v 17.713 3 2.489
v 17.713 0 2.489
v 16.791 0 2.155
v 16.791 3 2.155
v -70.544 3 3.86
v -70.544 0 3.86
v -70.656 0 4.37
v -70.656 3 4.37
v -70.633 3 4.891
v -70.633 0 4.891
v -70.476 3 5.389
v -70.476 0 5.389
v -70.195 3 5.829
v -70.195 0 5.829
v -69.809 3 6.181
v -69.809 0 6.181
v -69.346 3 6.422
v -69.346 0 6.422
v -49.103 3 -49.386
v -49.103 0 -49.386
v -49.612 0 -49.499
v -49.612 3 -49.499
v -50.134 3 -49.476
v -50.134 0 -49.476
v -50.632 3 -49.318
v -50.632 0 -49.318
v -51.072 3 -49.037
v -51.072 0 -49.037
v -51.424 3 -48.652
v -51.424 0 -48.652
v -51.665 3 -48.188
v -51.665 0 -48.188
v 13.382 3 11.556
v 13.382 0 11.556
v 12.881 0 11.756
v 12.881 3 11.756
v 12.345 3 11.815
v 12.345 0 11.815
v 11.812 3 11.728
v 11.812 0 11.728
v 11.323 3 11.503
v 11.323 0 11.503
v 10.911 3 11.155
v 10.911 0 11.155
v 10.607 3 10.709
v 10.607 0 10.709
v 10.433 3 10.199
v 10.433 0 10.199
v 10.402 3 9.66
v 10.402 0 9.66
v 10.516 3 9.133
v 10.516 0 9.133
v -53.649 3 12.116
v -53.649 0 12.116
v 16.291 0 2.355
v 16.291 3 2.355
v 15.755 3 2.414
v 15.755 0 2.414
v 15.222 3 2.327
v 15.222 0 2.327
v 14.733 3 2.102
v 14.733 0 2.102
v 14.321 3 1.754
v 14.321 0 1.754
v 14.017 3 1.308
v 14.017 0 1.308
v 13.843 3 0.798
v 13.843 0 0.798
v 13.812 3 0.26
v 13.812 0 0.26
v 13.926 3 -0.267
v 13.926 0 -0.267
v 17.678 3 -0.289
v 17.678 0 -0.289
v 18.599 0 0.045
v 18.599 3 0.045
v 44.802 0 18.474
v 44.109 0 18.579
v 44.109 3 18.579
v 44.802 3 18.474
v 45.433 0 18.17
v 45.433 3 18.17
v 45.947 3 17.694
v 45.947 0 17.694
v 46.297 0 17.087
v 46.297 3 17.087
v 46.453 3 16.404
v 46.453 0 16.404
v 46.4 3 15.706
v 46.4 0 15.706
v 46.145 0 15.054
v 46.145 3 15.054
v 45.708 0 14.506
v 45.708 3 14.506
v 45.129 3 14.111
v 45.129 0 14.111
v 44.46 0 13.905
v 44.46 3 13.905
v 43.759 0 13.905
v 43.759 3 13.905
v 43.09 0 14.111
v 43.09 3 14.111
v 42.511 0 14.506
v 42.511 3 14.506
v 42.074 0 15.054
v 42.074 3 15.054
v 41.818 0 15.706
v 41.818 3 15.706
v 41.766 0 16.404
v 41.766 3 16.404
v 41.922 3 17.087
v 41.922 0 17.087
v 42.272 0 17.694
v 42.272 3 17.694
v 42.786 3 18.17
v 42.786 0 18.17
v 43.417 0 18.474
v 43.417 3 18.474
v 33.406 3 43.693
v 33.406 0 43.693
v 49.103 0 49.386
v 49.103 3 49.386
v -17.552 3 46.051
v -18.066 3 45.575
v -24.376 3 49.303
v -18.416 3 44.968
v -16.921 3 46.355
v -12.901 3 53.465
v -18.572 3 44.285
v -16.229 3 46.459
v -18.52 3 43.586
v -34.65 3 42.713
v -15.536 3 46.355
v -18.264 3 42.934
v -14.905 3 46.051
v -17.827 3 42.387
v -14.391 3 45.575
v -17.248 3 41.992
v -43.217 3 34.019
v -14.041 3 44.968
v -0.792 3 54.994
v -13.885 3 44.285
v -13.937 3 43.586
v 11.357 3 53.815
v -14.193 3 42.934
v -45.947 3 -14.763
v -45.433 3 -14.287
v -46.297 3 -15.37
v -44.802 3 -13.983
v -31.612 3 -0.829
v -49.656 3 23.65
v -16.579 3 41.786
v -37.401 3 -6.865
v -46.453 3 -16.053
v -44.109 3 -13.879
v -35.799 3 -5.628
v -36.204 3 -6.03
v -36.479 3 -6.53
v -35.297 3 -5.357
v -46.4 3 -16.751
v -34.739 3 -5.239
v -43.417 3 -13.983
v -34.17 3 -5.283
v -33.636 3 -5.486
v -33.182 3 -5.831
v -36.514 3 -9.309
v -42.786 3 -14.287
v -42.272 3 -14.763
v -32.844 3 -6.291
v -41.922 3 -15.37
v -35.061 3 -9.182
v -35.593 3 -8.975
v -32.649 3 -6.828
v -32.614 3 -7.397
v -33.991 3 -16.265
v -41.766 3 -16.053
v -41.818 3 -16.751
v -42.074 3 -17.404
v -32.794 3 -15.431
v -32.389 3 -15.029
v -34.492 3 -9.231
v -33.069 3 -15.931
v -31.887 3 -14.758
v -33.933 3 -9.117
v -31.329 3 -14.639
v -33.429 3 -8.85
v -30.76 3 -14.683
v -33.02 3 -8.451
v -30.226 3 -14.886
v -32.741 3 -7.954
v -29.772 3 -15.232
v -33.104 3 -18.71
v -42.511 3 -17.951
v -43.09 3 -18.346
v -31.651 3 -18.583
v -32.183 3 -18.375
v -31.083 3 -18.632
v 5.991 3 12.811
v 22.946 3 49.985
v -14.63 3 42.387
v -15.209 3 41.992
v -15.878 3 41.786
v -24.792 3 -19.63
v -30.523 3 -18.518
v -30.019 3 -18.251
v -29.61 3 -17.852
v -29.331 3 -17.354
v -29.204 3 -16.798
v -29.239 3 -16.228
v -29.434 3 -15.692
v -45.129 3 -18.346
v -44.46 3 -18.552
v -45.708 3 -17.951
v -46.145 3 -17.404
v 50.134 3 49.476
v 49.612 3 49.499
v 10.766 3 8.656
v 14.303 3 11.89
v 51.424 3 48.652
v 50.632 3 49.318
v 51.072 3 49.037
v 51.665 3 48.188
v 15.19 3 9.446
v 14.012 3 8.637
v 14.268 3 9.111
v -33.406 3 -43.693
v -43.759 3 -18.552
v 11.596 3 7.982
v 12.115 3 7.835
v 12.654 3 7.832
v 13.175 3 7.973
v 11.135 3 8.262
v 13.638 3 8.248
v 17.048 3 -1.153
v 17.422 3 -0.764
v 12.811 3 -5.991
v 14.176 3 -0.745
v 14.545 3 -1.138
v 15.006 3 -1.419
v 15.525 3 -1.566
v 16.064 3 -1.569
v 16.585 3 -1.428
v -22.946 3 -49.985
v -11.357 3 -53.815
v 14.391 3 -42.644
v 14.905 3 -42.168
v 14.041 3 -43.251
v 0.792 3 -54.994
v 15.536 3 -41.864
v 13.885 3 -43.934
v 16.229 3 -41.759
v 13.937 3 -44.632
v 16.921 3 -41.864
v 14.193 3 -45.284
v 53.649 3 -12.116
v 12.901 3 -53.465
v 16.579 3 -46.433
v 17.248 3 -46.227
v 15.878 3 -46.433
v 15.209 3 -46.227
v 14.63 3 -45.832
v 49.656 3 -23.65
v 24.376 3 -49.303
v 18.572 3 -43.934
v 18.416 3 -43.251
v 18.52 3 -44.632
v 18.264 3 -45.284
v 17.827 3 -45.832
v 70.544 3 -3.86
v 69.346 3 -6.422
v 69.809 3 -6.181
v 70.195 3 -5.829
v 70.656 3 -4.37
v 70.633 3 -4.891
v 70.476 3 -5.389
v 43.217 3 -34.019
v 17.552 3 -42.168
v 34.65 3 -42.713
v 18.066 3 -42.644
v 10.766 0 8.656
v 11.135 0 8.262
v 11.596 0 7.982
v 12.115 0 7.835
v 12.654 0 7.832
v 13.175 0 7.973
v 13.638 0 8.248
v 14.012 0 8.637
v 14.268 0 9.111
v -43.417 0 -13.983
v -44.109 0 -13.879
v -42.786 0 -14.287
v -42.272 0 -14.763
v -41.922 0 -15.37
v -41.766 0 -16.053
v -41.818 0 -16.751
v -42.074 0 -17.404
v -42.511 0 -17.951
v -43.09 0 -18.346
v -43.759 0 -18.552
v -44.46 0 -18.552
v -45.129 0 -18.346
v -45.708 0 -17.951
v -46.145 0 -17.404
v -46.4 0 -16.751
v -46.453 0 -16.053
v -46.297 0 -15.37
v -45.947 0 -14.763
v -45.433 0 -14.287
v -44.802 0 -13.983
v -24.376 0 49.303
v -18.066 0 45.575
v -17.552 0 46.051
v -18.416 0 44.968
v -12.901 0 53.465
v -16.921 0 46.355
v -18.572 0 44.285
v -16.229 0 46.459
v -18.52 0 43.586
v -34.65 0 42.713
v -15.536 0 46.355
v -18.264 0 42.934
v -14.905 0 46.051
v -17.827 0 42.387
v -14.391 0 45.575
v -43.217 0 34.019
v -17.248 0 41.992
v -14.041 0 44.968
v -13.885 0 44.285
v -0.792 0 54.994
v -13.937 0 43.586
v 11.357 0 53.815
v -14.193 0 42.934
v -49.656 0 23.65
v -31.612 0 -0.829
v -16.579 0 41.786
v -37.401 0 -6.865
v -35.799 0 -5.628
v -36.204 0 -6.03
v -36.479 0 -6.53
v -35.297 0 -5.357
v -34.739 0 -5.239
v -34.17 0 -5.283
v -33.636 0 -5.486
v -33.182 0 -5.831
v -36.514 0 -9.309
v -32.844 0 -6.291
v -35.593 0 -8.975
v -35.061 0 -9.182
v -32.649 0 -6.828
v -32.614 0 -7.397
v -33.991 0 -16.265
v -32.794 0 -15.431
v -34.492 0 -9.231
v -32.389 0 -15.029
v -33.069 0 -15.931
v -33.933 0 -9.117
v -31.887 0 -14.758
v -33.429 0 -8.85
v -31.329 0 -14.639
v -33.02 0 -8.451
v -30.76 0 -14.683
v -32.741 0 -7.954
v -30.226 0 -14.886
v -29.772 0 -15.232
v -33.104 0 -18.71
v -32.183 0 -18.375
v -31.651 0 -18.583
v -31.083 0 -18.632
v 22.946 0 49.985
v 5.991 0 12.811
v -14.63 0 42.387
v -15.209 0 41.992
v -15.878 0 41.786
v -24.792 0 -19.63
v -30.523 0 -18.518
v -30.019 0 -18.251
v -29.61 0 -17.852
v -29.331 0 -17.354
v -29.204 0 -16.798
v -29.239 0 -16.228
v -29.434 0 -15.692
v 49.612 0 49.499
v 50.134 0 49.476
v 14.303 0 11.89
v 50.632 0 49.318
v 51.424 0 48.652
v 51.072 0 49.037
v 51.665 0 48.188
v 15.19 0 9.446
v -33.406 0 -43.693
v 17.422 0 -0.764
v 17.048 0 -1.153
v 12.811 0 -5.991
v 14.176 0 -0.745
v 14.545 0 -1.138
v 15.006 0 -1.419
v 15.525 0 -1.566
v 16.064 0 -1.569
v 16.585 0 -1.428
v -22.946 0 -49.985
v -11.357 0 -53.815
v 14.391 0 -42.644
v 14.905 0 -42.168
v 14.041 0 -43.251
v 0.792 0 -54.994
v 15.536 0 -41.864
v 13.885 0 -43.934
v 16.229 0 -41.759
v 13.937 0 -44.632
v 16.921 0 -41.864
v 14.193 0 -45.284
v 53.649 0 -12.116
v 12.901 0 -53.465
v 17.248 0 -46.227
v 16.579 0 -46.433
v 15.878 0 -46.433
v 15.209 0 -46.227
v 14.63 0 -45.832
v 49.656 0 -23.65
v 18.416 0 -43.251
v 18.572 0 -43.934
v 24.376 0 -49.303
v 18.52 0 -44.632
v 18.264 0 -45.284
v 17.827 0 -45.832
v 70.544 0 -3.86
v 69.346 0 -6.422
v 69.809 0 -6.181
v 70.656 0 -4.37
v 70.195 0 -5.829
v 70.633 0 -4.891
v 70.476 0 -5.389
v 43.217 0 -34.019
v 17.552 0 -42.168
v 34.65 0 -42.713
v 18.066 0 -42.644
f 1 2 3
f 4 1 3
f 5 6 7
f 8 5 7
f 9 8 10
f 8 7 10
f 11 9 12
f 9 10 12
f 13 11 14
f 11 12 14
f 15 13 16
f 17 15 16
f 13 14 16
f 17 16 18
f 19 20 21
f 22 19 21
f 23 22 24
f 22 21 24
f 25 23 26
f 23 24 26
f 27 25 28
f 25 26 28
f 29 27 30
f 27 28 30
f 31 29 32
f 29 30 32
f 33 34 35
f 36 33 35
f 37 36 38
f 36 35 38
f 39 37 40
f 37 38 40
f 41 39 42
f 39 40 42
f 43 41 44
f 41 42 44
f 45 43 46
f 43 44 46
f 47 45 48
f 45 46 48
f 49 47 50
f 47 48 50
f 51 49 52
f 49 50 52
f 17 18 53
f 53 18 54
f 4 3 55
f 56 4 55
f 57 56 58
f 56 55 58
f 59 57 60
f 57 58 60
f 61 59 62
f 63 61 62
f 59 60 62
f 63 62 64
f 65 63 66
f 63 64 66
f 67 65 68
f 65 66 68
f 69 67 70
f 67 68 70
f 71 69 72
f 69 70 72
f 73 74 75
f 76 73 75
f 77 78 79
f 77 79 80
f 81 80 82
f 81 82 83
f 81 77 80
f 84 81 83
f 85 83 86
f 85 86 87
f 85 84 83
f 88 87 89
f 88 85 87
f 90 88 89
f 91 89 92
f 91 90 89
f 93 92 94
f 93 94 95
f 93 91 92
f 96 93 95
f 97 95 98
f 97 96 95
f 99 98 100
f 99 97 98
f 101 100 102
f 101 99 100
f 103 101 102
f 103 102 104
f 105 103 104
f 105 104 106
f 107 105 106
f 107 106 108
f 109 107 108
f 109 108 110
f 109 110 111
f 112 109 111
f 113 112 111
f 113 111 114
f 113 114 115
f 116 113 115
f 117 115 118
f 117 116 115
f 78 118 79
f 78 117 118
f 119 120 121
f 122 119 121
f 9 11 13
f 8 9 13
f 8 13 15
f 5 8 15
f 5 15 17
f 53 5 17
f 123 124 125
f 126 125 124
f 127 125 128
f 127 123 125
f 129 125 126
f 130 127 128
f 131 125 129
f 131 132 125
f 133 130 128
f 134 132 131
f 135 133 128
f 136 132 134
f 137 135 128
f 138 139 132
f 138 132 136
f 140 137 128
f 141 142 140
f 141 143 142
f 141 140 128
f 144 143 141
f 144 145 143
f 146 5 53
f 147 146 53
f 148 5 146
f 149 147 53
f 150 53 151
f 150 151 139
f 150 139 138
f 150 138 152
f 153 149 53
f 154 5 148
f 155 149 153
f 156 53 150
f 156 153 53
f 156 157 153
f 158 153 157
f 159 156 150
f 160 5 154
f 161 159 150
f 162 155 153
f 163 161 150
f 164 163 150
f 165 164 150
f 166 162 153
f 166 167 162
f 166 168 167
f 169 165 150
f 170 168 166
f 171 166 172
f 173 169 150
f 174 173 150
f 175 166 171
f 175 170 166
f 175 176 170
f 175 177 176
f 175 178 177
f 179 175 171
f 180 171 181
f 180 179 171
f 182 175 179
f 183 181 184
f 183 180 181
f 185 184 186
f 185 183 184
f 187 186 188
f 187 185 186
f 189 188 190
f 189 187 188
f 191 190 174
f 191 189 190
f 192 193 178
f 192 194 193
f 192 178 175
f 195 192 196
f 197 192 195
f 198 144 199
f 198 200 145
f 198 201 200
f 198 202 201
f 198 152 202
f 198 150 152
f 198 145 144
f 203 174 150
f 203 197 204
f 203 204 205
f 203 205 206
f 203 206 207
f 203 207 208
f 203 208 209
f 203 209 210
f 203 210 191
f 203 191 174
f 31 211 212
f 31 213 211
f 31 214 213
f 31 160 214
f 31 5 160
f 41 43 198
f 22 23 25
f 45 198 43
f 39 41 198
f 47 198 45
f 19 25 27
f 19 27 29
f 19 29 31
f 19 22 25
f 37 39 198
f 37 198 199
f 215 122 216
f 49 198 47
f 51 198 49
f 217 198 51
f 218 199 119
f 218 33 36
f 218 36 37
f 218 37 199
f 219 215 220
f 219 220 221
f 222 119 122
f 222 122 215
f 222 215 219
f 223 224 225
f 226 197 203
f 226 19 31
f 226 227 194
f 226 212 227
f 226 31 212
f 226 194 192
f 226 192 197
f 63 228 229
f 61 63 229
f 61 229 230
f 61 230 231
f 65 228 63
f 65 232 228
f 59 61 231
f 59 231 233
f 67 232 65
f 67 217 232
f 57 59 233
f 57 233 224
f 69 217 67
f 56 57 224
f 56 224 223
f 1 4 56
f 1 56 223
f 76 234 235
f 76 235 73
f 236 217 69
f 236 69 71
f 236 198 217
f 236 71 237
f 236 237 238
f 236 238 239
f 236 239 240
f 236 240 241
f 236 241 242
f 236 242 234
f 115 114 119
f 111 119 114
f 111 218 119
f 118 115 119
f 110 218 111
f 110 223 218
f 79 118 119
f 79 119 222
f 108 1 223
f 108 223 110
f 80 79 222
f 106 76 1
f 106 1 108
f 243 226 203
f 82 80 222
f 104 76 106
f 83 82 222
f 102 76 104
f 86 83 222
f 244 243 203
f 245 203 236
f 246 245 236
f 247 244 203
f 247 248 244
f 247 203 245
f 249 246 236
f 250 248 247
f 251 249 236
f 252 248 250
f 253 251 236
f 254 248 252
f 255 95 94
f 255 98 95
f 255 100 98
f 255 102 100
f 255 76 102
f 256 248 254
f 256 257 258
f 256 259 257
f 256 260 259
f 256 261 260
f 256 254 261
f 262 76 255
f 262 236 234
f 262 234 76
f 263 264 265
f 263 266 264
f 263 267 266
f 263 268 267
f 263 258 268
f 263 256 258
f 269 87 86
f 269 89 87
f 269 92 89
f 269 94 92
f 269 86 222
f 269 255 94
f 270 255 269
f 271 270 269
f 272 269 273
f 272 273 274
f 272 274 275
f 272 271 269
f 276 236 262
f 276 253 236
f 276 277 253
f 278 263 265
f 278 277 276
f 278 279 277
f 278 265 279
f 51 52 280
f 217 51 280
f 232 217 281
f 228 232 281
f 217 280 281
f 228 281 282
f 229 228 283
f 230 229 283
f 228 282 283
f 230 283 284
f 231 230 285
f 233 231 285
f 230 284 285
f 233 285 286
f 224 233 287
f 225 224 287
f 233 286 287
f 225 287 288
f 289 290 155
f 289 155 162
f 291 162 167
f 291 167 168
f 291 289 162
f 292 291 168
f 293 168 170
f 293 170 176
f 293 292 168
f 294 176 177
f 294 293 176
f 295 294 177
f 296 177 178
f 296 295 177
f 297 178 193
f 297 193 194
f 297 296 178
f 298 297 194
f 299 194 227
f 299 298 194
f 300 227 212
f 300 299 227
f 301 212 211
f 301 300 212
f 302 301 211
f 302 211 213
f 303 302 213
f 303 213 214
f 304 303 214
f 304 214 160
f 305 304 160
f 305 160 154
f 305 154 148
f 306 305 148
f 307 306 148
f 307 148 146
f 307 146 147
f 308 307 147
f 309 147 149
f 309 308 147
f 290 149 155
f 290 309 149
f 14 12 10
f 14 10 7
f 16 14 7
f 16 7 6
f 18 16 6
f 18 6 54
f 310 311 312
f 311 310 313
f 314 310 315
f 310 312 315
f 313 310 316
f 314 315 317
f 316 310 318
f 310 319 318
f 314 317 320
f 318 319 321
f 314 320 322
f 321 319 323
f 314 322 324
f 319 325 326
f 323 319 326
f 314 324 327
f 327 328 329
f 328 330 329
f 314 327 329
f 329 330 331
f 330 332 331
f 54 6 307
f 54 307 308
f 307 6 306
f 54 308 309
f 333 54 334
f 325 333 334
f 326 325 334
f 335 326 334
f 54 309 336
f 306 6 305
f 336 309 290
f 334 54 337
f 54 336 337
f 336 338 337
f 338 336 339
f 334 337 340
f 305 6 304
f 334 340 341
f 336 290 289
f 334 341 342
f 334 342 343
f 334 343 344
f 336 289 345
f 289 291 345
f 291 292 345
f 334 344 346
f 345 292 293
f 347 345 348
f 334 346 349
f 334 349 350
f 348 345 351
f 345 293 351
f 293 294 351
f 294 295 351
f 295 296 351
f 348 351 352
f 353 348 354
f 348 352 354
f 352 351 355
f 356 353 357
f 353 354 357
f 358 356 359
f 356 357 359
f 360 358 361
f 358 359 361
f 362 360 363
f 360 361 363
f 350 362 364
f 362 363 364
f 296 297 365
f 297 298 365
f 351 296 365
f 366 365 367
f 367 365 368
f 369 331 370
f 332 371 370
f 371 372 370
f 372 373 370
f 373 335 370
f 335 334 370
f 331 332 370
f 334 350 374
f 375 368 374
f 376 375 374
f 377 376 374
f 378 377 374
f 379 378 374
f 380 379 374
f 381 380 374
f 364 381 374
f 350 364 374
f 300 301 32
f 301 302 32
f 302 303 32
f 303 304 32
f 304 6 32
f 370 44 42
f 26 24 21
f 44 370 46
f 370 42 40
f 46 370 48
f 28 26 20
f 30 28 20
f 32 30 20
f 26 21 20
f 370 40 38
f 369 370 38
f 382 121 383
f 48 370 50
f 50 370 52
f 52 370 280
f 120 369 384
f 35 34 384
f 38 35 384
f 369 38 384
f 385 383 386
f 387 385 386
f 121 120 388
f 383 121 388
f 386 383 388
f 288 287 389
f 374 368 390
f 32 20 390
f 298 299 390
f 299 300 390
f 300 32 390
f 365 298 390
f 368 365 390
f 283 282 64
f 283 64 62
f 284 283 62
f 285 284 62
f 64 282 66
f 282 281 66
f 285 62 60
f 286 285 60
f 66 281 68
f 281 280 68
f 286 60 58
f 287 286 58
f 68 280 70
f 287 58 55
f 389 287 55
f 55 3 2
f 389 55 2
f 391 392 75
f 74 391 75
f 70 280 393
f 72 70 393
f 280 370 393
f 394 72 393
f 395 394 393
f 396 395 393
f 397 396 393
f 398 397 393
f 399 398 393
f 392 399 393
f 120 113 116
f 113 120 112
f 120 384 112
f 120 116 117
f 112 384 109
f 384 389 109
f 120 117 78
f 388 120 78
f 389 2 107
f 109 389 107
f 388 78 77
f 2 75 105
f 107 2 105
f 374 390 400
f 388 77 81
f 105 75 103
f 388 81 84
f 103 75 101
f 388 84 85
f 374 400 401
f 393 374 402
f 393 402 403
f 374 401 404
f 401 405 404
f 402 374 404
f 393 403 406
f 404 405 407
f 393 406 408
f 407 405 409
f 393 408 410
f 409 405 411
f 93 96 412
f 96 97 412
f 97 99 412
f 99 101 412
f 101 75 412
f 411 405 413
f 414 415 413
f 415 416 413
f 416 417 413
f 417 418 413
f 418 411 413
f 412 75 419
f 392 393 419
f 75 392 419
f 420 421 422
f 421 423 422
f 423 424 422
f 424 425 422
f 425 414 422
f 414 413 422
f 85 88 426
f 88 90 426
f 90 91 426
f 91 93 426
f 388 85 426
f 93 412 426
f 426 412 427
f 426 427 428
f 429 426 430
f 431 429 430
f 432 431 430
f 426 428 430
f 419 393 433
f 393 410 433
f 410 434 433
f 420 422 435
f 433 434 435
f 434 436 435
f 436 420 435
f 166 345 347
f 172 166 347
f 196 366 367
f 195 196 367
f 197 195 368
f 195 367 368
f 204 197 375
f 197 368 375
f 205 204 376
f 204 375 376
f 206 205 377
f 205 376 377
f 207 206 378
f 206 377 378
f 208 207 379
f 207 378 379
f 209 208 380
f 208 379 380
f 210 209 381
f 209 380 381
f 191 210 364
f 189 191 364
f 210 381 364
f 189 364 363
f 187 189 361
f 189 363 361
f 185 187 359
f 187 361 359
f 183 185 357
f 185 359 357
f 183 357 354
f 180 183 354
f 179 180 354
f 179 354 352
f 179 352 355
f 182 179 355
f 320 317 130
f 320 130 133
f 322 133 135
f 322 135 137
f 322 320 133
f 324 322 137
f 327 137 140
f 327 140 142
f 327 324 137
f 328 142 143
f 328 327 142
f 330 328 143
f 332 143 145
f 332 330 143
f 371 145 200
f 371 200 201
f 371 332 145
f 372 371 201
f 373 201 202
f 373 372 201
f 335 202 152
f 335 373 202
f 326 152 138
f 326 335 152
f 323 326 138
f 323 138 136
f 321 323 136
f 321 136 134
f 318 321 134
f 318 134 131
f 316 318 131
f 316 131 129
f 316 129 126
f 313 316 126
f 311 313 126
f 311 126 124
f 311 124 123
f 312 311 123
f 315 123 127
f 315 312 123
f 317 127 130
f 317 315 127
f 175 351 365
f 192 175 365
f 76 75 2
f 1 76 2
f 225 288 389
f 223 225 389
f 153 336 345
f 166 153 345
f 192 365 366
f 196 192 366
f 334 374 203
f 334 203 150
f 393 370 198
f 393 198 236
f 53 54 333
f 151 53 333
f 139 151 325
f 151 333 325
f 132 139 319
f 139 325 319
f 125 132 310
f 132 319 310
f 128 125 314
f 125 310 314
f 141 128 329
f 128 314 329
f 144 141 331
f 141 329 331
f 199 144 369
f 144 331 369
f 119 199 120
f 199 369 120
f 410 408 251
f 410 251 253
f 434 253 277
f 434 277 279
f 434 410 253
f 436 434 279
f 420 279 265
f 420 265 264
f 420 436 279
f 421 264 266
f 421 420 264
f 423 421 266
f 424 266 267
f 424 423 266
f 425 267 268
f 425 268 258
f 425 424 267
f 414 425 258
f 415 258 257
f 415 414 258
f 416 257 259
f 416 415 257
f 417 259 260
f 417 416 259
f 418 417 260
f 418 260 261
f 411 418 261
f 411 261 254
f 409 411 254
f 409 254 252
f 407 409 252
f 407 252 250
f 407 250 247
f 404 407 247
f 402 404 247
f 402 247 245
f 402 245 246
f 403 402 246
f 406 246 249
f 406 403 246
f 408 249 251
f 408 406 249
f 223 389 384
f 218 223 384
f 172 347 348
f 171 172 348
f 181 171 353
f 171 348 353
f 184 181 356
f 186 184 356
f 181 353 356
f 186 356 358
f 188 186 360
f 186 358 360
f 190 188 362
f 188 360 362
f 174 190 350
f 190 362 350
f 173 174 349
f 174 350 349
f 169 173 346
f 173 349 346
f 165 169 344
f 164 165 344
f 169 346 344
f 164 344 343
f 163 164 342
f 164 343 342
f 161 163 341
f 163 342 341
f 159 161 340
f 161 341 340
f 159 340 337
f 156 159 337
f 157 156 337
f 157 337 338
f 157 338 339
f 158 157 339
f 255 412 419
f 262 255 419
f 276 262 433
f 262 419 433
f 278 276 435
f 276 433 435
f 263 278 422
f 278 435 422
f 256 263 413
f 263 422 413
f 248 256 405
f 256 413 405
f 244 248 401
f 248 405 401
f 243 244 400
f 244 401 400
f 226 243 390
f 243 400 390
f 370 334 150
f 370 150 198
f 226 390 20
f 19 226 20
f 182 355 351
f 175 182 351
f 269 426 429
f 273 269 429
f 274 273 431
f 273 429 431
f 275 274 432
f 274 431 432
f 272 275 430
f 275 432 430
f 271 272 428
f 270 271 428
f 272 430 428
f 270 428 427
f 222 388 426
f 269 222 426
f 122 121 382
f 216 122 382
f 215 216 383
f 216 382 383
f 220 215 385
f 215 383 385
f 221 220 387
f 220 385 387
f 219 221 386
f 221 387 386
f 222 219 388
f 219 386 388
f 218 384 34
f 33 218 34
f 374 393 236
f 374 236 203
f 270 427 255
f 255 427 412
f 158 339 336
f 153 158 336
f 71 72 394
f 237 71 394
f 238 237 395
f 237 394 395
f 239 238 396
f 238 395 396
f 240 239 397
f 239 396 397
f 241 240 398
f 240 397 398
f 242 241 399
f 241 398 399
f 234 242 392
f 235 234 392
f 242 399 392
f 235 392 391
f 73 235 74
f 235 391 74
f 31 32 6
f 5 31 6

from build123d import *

# Parameters (mm, degrees)
SKETCH_10_R         = 2.35
EXTRUDE_2_DEPTH     = 3
CUT_EXTRUDE_3_DEPTH = 3


with BuildPart() as part:
    # 草图10 → 凸台-拉伸2 (new body)
    with BuildSketch(Plane(origin=(0, 0, 0), x_dir=(1, 0, 0), z_dir=(0, 1, 0))):
        with BuildLine():
            Line((33.405753886, -43.6927409), (49.102625926, -49.386437869))
            ThreePointArc((49.102625926, -49.386437869), (50.631828553, -49.317990247), (51.664738322, -48.188280923))
            Line((51.664738322, -48.188280923), (70.544015322, 3.859728807))
            ThreePointArc((70.544015322, 3.859728807), (70.4755677, 5.388931433), (69.345858375, 6.421841203))
            Line((69.345858375, 6.421841203), (53.648986335, 12.115538173))
            ThreePointArc((53.648986335, 12.115538173), (18.754387434, 51.703703465), (-33.405753886, 43.6927409))
            Line((-33.405753886, 43.6927409), (-49.102625926, 49.386437869))
            ThreePointArc((-49.102625926, 49.386437869), (-50.631828553, 49.317990247), (-51.664738322, 48.188280923))
            Line((-51.664738322, 48.188280923), (-70.544015322, -3.859728807))
            ThreePointArc((-70.544015322, -3.859728807), (-70.4755677, -5.388931433), (-69.345858375, -6.421841203))
            Line((-69.345858375, -6.421841203), (-53.648986335, -12.115538173))
            ThreePointArc((-53.648986335, -12.115538173), (-18.754387434, -51.703703465), (33.405753886, -43.6927409))
        make_face()
        with Locations(Location((16.22853422, 44.109349089, 0), (0, 0, 270))):
            Circle(SKETCH_10_R, mode=Mode.SUBTRACT)
        with Locations(Location((-44.109349089, 16.22853422, 0), (0, 0, 270))):
            Circle(SKETCH_10_R, mode=Mode.SUBTRACT)
        with Locations(Location((-16.22853422, -44.109349089, 0), (0, 0, 270))):
            Circle(SKETCH_10_R, mode=Mode.SUBTRACT)
        with Locations(Location((44.109349089, -16.22853422, 0), (0, 0, 270))):
            Circle(SKETCH_10_R, mode=Mode.SUBTRACT)
    extrude(amount=EXTRUDE_2_DEPTH)

    # 草图11 → 切除-拉伸3 (cut)
    with BuildSketch(Plane(origin=(0, 0, 0), x_dir=(1, 0, 0), z_dir=(0, 1, 0))):
        with BuildLine():
            Line((14.302948542, -11.889729308), (13.381558854, -11.555515354))
            ThreePointArc((13.381558854, -11.555515354), (11.104938847, -11.342582915), (10.515931052, -9.13319189))
            ThreePointArc((10.515931052, -9.13319189), (12.384418559, -7.81520353), (14.268129897, -9.111340281))
            Line((14.268129897, -9.111340281), (15.189519584, -9.445554235))
            Line((15.189519584, -9.445554235), (14.302948542, -11.889729308))
        make_face()
        with BuildLine():
            Line((17.678018521, 0.289333077), (18.599408209, -0.044880878))
            Line((18.599408209, -0.044880878), (17.712837166, -2.48905595))
            Line((17.712837166, -2.48905595), (16.791447479, -2.154841996))
            ThreePointArc((16.791447479, -2.154841996), (14.514827471, -1.941909558), (13.925819677, 0.267481467))
            ThreePointArc((13.925819677, 0.267481467), (15.794307183, 1.585469828), (17.678018521, 0.289333077))
        make_face()
        with BuildLine():
            Line((-33.104295256, 18.709506556), (-32.182905569, 18.375292602))
            ThreePointArc((-32.182905569, 18.375292602), (-29.317277767, 15.952969139), (-33.069476611, 15.931117529))
            Line((-33.069476611, 15.931117529), (-33.990866299, 16.265331483))
            Line((-33.990866299, 16.265331483), (-33.104295256, 18.709506556))
        make_face()
        with BuildLine():
            Line((-36.514183881, 9.308833199), (-35.592794193, 8.974619245))
            ThreePointArc((-35.592794193, 8.974619245), (-32.727166391, 6.552295782), (-36.479365236, 6.530444172))
            Line((-36.479365236, 6.530444172), (-37.400754923, 6.864658126))
            Line((-37.400754923, 6.864658126), (-36.514183881, 9.308833199))
        make_face()
        Polygon((-24.792131447, 19.63033923), (-31.611908696, 0.828992516), (5.990784733, -12.810561982), (12.810561982, 5.990784733), align=None)
    extrude(amount=CUT_EXTRUDE_3_DEPTH, mode=Mode.SUBTRACT)


solid = part.part
